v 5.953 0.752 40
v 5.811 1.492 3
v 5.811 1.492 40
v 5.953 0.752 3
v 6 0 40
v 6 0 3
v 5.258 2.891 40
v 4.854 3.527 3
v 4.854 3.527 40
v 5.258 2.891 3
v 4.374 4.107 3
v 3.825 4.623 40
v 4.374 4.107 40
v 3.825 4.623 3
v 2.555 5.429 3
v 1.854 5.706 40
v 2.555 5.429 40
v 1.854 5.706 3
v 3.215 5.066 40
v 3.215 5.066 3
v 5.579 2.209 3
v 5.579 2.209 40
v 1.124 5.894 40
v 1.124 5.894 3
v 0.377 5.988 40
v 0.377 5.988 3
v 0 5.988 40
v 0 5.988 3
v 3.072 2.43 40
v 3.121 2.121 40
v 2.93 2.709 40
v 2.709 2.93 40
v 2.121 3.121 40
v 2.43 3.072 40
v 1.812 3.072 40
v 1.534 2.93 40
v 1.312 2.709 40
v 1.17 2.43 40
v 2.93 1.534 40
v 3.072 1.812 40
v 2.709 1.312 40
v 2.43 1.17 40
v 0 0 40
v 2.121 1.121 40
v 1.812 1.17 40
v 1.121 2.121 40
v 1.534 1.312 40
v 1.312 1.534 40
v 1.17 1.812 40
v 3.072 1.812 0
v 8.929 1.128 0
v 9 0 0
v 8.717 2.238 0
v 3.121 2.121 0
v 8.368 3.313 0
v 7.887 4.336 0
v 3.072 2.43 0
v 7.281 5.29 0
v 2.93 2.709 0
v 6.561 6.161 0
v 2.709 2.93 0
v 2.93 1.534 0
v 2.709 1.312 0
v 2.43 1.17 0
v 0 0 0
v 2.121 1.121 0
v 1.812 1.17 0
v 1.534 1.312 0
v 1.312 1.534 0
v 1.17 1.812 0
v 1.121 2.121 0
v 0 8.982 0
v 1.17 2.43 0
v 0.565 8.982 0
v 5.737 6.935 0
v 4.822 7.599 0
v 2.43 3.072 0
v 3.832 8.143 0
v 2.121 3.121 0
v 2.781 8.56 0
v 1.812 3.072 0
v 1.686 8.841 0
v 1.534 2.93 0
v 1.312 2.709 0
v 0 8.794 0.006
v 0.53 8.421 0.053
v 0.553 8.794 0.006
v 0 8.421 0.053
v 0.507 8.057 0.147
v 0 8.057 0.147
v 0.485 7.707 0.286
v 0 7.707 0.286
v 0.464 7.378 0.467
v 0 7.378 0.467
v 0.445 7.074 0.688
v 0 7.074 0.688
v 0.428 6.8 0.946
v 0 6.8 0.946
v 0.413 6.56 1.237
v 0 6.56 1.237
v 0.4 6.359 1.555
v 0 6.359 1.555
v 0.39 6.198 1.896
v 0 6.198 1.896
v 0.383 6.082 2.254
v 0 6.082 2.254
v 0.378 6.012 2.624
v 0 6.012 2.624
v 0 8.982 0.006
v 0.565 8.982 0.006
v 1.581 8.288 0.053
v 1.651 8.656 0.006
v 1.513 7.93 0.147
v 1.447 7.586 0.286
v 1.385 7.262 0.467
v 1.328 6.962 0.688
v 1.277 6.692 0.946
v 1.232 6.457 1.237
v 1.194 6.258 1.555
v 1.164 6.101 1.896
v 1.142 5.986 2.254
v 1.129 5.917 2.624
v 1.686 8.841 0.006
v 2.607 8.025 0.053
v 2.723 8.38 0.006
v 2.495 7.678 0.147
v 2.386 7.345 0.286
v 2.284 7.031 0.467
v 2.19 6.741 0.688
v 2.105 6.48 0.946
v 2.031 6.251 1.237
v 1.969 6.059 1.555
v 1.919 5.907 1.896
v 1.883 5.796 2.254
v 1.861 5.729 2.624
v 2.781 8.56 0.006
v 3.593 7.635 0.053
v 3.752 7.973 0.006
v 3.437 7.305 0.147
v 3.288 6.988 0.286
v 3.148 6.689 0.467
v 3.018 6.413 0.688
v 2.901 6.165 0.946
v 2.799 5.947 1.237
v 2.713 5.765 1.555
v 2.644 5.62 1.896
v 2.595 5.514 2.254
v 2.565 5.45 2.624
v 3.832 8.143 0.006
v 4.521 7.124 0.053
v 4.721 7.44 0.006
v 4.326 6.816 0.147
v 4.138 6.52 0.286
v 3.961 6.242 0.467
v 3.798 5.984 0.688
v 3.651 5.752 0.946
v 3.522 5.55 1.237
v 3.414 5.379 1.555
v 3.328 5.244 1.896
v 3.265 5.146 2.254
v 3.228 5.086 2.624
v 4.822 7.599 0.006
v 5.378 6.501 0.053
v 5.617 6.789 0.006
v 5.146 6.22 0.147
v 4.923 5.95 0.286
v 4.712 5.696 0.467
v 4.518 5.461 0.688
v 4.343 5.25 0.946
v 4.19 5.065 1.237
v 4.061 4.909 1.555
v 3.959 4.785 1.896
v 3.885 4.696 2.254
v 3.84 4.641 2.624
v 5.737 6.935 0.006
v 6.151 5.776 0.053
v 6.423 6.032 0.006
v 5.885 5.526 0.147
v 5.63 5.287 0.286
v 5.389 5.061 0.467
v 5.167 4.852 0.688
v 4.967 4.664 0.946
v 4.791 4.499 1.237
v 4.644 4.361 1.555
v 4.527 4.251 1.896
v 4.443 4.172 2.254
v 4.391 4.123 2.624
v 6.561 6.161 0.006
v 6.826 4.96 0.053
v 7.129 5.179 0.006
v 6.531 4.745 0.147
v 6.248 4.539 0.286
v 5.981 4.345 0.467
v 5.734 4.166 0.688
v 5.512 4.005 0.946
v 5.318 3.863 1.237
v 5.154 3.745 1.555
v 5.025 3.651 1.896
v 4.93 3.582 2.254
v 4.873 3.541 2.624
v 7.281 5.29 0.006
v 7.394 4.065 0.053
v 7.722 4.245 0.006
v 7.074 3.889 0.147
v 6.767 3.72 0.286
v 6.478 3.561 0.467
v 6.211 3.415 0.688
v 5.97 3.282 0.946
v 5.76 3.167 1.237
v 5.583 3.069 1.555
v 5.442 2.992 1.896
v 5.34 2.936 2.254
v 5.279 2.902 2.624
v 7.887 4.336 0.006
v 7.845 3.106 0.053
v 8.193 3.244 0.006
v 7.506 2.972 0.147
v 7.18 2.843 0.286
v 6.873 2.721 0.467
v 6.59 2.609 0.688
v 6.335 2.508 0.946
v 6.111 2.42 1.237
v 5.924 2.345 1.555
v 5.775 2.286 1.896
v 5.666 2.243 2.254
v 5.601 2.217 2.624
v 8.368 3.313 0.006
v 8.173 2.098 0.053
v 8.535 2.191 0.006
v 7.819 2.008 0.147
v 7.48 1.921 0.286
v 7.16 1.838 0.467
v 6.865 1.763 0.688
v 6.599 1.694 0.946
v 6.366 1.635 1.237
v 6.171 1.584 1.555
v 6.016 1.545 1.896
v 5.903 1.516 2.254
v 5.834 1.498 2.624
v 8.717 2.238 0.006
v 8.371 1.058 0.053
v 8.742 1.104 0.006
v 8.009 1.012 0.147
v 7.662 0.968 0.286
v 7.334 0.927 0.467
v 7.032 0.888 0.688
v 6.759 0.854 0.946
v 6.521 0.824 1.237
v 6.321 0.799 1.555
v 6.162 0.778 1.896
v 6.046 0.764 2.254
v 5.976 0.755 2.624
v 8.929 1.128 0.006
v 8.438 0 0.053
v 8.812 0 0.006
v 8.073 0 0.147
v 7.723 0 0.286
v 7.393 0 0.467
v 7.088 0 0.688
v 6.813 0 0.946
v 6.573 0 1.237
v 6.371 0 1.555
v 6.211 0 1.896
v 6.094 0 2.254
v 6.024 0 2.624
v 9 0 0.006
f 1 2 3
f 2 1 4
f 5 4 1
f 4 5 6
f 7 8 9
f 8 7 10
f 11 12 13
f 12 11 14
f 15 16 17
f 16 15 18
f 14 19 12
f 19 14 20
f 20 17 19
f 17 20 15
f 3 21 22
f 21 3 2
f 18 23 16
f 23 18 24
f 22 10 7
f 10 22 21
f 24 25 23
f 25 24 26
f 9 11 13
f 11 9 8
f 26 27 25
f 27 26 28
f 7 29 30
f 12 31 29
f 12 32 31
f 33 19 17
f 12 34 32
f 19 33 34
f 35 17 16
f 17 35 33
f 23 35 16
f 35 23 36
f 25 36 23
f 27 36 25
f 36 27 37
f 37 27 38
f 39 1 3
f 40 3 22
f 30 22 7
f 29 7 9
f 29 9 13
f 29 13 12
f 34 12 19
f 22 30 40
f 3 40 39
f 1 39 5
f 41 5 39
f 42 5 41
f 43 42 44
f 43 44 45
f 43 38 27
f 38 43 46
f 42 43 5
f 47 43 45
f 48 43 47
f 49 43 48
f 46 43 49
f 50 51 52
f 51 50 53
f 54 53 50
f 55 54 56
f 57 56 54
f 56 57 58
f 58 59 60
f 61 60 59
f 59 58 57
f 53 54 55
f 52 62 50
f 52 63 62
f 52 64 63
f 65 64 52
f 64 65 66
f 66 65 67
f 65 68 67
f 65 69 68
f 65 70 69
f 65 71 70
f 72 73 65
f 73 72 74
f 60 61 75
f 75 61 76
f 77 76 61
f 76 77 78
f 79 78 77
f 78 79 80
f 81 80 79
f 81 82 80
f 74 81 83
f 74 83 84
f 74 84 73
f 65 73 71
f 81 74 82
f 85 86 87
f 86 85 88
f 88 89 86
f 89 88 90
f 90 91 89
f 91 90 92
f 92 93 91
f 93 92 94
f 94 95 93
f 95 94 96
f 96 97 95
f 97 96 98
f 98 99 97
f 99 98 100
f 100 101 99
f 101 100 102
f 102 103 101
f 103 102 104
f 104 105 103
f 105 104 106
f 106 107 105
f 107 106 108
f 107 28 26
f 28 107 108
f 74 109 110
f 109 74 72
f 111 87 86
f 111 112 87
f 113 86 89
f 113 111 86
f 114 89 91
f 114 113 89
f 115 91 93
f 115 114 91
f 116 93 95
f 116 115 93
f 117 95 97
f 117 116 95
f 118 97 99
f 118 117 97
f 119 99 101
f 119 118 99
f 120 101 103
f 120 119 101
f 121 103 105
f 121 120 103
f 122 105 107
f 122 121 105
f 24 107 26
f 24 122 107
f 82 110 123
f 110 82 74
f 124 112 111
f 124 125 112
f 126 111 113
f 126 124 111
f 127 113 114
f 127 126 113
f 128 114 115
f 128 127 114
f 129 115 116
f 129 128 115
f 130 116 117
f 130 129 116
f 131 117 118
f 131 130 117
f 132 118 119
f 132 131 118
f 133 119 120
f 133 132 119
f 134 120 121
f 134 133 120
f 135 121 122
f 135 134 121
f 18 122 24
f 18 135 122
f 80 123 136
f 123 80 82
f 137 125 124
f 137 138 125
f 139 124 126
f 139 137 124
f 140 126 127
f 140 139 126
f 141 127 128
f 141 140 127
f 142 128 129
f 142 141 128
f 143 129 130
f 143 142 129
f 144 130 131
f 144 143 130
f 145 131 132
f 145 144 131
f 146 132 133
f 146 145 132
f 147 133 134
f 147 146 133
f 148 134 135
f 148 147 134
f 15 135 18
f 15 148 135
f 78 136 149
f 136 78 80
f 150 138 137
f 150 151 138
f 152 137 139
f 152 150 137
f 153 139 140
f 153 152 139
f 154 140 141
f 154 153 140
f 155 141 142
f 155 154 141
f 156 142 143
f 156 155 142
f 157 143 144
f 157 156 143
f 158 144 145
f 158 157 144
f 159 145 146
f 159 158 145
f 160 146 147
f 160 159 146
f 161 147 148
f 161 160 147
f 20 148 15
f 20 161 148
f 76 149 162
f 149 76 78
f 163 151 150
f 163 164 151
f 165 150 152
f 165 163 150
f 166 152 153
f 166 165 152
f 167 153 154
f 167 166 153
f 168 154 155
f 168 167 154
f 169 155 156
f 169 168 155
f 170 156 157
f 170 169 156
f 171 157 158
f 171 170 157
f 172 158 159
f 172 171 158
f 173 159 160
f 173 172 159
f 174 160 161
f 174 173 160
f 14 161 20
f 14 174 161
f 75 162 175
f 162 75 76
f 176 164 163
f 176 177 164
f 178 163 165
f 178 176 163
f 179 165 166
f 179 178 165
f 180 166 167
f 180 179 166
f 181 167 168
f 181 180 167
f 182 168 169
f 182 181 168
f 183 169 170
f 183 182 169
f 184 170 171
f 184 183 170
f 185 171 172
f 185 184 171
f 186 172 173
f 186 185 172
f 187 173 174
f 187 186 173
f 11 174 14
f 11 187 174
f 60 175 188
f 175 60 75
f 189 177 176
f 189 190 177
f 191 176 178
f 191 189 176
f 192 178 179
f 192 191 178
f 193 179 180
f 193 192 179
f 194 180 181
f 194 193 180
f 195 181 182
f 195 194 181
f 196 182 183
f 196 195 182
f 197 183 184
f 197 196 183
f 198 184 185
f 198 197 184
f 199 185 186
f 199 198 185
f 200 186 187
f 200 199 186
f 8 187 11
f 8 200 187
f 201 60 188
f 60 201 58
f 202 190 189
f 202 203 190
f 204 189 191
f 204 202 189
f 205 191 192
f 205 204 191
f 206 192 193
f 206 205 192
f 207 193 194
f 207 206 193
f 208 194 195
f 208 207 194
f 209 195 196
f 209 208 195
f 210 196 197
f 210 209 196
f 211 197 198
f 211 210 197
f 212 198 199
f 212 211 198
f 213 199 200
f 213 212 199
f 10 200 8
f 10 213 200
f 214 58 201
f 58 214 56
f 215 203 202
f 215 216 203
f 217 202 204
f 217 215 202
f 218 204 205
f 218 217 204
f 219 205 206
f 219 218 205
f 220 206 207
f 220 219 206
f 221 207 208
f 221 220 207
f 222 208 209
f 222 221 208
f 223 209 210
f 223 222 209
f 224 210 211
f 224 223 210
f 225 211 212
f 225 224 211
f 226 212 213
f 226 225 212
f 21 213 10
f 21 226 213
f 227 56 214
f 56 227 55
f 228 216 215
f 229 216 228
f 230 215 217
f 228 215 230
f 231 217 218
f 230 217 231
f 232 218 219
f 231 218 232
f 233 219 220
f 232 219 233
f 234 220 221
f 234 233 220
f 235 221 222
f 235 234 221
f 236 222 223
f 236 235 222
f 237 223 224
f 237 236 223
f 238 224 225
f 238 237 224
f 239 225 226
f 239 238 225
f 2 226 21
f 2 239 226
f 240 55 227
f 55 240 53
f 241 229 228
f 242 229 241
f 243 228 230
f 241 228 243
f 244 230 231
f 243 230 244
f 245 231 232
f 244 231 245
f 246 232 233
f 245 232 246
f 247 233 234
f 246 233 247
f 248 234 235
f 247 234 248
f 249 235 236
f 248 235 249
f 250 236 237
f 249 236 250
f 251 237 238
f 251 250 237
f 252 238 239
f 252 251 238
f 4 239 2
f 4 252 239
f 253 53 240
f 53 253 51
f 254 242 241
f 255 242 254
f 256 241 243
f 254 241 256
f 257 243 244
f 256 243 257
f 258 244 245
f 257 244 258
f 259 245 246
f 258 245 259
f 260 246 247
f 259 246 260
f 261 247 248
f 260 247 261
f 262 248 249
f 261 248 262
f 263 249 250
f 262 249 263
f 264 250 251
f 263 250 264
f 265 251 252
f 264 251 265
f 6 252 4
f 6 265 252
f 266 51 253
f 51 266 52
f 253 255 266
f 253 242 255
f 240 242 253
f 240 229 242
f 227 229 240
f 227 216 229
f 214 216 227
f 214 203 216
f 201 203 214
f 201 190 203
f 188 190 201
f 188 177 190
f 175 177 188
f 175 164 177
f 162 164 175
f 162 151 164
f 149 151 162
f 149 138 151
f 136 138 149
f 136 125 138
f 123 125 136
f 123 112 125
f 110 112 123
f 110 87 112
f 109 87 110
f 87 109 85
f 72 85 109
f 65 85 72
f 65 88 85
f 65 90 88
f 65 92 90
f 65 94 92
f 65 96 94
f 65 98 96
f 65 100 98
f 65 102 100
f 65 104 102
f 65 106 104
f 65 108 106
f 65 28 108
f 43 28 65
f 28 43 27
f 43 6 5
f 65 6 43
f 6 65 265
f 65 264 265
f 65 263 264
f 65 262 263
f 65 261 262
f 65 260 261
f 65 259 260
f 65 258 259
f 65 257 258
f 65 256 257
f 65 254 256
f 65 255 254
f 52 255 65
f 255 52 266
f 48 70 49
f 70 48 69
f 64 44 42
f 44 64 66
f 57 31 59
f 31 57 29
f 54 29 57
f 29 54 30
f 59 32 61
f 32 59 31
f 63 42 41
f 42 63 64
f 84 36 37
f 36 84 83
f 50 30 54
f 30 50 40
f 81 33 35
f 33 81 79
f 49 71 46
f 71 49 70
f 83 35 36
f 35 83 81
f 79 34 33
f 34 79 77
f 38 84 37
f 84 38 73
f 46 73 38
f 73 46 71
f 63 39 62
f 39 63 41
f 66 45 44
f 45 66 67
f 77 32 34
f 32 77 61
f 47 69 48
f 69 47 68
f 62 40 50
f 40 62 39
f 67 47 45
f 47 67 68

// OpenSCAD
// file: quadrant.scad
/*
Author: Dave Clucas 2021 Version 0.2
Create a quadrant shaped pillar for supporting an enclosure lid
*/
//Example
quadrant(w=10,r=0,h=12,fn=50, brim=0);


module quadrant(w=8, r=0,h=10, fn = 50, brim=0 ) {
    if (brim>0){
        translate([0,0,h]){
            difference(){
                cube([w,w,brim]);
                translate([2,2,0])
                cube([w,w,brim+0.1]);
            }
        }
    }

	intersection(){
		cube([w+r,w+r,h]);
		union(){
 			cylinder(h,w,w,$fn=fn);
				rotate_extrude(angle=360,convexity=10,$fn=fn){
				translate([w,0,0])
				difference(){   //fillet shape
					square(r);
					translate([r,r,0])
					circle(r,$fn=fn);
				}
			}
		}
	}
}
// main file
/*
Author: Dave Clucas 2021 version 0
This module creates a post for supporting PCB mounted circuits
Options are size and shape and a fillet at the base of the post
Choosing a hole size of 0 or less omits the hole
Setting pin to true fills the hole with a pin which protrudes 3 units
Pin position may be offset using offsets x,y,z
*/
//use <arc.scad>
use <quadrant.scad>

module post(h=10,d=6,pd=2,f=3,shape=0,ph=3){
	holePos=[[0,0,0],[d/2,d/2,0],[d/2*sin(45),d/2*sin(45),0]];	//hole position for each shape

	difference(){		
		shape(s=shape,r=d,f=3,h=h,t=0,ph=0,pd=0);	//create basic shape
		translate(holePos[shape]){
			cylinder(h=h+ph+0.2,d=abs(pd),$fn=20,center=false); //make hole
		}
	}
}

module fillet(f){
	difference(){   //fillet shape
		square(f);
		translate([f,f,0])
		circle(f,$fn=20);
	}
}

module shape(s=2,r=8,h=12,f=3,t=0,ph=0,pd=0){
	//create shape without hole
	if (s==0){
		cylinder(h,d=r,$fn=20);
		rotate_extrude(angle=360,convexity=10)
		translate([r/2,0,-0.1])
		fillet(f);
	}
	if (s==1){
		cube([abs(r),abs(r),h]);	//shape is square
		translate([r/2,r/2,0]){
			rotate_extrude(angle=360,convexity=10)//
			translate([r/2,0,0])
			fillet(f);
		}
	}
	if (s==2){
		quadrant(r,f,h,brim=0,fn=50);	//shape is quadrant (radius,fillet,height,facet no)
//		cylinder(h+ph,pd,pd);
	}
}

post(h=40,d=6,pd=2,f=3,shape=2,ph=2);
